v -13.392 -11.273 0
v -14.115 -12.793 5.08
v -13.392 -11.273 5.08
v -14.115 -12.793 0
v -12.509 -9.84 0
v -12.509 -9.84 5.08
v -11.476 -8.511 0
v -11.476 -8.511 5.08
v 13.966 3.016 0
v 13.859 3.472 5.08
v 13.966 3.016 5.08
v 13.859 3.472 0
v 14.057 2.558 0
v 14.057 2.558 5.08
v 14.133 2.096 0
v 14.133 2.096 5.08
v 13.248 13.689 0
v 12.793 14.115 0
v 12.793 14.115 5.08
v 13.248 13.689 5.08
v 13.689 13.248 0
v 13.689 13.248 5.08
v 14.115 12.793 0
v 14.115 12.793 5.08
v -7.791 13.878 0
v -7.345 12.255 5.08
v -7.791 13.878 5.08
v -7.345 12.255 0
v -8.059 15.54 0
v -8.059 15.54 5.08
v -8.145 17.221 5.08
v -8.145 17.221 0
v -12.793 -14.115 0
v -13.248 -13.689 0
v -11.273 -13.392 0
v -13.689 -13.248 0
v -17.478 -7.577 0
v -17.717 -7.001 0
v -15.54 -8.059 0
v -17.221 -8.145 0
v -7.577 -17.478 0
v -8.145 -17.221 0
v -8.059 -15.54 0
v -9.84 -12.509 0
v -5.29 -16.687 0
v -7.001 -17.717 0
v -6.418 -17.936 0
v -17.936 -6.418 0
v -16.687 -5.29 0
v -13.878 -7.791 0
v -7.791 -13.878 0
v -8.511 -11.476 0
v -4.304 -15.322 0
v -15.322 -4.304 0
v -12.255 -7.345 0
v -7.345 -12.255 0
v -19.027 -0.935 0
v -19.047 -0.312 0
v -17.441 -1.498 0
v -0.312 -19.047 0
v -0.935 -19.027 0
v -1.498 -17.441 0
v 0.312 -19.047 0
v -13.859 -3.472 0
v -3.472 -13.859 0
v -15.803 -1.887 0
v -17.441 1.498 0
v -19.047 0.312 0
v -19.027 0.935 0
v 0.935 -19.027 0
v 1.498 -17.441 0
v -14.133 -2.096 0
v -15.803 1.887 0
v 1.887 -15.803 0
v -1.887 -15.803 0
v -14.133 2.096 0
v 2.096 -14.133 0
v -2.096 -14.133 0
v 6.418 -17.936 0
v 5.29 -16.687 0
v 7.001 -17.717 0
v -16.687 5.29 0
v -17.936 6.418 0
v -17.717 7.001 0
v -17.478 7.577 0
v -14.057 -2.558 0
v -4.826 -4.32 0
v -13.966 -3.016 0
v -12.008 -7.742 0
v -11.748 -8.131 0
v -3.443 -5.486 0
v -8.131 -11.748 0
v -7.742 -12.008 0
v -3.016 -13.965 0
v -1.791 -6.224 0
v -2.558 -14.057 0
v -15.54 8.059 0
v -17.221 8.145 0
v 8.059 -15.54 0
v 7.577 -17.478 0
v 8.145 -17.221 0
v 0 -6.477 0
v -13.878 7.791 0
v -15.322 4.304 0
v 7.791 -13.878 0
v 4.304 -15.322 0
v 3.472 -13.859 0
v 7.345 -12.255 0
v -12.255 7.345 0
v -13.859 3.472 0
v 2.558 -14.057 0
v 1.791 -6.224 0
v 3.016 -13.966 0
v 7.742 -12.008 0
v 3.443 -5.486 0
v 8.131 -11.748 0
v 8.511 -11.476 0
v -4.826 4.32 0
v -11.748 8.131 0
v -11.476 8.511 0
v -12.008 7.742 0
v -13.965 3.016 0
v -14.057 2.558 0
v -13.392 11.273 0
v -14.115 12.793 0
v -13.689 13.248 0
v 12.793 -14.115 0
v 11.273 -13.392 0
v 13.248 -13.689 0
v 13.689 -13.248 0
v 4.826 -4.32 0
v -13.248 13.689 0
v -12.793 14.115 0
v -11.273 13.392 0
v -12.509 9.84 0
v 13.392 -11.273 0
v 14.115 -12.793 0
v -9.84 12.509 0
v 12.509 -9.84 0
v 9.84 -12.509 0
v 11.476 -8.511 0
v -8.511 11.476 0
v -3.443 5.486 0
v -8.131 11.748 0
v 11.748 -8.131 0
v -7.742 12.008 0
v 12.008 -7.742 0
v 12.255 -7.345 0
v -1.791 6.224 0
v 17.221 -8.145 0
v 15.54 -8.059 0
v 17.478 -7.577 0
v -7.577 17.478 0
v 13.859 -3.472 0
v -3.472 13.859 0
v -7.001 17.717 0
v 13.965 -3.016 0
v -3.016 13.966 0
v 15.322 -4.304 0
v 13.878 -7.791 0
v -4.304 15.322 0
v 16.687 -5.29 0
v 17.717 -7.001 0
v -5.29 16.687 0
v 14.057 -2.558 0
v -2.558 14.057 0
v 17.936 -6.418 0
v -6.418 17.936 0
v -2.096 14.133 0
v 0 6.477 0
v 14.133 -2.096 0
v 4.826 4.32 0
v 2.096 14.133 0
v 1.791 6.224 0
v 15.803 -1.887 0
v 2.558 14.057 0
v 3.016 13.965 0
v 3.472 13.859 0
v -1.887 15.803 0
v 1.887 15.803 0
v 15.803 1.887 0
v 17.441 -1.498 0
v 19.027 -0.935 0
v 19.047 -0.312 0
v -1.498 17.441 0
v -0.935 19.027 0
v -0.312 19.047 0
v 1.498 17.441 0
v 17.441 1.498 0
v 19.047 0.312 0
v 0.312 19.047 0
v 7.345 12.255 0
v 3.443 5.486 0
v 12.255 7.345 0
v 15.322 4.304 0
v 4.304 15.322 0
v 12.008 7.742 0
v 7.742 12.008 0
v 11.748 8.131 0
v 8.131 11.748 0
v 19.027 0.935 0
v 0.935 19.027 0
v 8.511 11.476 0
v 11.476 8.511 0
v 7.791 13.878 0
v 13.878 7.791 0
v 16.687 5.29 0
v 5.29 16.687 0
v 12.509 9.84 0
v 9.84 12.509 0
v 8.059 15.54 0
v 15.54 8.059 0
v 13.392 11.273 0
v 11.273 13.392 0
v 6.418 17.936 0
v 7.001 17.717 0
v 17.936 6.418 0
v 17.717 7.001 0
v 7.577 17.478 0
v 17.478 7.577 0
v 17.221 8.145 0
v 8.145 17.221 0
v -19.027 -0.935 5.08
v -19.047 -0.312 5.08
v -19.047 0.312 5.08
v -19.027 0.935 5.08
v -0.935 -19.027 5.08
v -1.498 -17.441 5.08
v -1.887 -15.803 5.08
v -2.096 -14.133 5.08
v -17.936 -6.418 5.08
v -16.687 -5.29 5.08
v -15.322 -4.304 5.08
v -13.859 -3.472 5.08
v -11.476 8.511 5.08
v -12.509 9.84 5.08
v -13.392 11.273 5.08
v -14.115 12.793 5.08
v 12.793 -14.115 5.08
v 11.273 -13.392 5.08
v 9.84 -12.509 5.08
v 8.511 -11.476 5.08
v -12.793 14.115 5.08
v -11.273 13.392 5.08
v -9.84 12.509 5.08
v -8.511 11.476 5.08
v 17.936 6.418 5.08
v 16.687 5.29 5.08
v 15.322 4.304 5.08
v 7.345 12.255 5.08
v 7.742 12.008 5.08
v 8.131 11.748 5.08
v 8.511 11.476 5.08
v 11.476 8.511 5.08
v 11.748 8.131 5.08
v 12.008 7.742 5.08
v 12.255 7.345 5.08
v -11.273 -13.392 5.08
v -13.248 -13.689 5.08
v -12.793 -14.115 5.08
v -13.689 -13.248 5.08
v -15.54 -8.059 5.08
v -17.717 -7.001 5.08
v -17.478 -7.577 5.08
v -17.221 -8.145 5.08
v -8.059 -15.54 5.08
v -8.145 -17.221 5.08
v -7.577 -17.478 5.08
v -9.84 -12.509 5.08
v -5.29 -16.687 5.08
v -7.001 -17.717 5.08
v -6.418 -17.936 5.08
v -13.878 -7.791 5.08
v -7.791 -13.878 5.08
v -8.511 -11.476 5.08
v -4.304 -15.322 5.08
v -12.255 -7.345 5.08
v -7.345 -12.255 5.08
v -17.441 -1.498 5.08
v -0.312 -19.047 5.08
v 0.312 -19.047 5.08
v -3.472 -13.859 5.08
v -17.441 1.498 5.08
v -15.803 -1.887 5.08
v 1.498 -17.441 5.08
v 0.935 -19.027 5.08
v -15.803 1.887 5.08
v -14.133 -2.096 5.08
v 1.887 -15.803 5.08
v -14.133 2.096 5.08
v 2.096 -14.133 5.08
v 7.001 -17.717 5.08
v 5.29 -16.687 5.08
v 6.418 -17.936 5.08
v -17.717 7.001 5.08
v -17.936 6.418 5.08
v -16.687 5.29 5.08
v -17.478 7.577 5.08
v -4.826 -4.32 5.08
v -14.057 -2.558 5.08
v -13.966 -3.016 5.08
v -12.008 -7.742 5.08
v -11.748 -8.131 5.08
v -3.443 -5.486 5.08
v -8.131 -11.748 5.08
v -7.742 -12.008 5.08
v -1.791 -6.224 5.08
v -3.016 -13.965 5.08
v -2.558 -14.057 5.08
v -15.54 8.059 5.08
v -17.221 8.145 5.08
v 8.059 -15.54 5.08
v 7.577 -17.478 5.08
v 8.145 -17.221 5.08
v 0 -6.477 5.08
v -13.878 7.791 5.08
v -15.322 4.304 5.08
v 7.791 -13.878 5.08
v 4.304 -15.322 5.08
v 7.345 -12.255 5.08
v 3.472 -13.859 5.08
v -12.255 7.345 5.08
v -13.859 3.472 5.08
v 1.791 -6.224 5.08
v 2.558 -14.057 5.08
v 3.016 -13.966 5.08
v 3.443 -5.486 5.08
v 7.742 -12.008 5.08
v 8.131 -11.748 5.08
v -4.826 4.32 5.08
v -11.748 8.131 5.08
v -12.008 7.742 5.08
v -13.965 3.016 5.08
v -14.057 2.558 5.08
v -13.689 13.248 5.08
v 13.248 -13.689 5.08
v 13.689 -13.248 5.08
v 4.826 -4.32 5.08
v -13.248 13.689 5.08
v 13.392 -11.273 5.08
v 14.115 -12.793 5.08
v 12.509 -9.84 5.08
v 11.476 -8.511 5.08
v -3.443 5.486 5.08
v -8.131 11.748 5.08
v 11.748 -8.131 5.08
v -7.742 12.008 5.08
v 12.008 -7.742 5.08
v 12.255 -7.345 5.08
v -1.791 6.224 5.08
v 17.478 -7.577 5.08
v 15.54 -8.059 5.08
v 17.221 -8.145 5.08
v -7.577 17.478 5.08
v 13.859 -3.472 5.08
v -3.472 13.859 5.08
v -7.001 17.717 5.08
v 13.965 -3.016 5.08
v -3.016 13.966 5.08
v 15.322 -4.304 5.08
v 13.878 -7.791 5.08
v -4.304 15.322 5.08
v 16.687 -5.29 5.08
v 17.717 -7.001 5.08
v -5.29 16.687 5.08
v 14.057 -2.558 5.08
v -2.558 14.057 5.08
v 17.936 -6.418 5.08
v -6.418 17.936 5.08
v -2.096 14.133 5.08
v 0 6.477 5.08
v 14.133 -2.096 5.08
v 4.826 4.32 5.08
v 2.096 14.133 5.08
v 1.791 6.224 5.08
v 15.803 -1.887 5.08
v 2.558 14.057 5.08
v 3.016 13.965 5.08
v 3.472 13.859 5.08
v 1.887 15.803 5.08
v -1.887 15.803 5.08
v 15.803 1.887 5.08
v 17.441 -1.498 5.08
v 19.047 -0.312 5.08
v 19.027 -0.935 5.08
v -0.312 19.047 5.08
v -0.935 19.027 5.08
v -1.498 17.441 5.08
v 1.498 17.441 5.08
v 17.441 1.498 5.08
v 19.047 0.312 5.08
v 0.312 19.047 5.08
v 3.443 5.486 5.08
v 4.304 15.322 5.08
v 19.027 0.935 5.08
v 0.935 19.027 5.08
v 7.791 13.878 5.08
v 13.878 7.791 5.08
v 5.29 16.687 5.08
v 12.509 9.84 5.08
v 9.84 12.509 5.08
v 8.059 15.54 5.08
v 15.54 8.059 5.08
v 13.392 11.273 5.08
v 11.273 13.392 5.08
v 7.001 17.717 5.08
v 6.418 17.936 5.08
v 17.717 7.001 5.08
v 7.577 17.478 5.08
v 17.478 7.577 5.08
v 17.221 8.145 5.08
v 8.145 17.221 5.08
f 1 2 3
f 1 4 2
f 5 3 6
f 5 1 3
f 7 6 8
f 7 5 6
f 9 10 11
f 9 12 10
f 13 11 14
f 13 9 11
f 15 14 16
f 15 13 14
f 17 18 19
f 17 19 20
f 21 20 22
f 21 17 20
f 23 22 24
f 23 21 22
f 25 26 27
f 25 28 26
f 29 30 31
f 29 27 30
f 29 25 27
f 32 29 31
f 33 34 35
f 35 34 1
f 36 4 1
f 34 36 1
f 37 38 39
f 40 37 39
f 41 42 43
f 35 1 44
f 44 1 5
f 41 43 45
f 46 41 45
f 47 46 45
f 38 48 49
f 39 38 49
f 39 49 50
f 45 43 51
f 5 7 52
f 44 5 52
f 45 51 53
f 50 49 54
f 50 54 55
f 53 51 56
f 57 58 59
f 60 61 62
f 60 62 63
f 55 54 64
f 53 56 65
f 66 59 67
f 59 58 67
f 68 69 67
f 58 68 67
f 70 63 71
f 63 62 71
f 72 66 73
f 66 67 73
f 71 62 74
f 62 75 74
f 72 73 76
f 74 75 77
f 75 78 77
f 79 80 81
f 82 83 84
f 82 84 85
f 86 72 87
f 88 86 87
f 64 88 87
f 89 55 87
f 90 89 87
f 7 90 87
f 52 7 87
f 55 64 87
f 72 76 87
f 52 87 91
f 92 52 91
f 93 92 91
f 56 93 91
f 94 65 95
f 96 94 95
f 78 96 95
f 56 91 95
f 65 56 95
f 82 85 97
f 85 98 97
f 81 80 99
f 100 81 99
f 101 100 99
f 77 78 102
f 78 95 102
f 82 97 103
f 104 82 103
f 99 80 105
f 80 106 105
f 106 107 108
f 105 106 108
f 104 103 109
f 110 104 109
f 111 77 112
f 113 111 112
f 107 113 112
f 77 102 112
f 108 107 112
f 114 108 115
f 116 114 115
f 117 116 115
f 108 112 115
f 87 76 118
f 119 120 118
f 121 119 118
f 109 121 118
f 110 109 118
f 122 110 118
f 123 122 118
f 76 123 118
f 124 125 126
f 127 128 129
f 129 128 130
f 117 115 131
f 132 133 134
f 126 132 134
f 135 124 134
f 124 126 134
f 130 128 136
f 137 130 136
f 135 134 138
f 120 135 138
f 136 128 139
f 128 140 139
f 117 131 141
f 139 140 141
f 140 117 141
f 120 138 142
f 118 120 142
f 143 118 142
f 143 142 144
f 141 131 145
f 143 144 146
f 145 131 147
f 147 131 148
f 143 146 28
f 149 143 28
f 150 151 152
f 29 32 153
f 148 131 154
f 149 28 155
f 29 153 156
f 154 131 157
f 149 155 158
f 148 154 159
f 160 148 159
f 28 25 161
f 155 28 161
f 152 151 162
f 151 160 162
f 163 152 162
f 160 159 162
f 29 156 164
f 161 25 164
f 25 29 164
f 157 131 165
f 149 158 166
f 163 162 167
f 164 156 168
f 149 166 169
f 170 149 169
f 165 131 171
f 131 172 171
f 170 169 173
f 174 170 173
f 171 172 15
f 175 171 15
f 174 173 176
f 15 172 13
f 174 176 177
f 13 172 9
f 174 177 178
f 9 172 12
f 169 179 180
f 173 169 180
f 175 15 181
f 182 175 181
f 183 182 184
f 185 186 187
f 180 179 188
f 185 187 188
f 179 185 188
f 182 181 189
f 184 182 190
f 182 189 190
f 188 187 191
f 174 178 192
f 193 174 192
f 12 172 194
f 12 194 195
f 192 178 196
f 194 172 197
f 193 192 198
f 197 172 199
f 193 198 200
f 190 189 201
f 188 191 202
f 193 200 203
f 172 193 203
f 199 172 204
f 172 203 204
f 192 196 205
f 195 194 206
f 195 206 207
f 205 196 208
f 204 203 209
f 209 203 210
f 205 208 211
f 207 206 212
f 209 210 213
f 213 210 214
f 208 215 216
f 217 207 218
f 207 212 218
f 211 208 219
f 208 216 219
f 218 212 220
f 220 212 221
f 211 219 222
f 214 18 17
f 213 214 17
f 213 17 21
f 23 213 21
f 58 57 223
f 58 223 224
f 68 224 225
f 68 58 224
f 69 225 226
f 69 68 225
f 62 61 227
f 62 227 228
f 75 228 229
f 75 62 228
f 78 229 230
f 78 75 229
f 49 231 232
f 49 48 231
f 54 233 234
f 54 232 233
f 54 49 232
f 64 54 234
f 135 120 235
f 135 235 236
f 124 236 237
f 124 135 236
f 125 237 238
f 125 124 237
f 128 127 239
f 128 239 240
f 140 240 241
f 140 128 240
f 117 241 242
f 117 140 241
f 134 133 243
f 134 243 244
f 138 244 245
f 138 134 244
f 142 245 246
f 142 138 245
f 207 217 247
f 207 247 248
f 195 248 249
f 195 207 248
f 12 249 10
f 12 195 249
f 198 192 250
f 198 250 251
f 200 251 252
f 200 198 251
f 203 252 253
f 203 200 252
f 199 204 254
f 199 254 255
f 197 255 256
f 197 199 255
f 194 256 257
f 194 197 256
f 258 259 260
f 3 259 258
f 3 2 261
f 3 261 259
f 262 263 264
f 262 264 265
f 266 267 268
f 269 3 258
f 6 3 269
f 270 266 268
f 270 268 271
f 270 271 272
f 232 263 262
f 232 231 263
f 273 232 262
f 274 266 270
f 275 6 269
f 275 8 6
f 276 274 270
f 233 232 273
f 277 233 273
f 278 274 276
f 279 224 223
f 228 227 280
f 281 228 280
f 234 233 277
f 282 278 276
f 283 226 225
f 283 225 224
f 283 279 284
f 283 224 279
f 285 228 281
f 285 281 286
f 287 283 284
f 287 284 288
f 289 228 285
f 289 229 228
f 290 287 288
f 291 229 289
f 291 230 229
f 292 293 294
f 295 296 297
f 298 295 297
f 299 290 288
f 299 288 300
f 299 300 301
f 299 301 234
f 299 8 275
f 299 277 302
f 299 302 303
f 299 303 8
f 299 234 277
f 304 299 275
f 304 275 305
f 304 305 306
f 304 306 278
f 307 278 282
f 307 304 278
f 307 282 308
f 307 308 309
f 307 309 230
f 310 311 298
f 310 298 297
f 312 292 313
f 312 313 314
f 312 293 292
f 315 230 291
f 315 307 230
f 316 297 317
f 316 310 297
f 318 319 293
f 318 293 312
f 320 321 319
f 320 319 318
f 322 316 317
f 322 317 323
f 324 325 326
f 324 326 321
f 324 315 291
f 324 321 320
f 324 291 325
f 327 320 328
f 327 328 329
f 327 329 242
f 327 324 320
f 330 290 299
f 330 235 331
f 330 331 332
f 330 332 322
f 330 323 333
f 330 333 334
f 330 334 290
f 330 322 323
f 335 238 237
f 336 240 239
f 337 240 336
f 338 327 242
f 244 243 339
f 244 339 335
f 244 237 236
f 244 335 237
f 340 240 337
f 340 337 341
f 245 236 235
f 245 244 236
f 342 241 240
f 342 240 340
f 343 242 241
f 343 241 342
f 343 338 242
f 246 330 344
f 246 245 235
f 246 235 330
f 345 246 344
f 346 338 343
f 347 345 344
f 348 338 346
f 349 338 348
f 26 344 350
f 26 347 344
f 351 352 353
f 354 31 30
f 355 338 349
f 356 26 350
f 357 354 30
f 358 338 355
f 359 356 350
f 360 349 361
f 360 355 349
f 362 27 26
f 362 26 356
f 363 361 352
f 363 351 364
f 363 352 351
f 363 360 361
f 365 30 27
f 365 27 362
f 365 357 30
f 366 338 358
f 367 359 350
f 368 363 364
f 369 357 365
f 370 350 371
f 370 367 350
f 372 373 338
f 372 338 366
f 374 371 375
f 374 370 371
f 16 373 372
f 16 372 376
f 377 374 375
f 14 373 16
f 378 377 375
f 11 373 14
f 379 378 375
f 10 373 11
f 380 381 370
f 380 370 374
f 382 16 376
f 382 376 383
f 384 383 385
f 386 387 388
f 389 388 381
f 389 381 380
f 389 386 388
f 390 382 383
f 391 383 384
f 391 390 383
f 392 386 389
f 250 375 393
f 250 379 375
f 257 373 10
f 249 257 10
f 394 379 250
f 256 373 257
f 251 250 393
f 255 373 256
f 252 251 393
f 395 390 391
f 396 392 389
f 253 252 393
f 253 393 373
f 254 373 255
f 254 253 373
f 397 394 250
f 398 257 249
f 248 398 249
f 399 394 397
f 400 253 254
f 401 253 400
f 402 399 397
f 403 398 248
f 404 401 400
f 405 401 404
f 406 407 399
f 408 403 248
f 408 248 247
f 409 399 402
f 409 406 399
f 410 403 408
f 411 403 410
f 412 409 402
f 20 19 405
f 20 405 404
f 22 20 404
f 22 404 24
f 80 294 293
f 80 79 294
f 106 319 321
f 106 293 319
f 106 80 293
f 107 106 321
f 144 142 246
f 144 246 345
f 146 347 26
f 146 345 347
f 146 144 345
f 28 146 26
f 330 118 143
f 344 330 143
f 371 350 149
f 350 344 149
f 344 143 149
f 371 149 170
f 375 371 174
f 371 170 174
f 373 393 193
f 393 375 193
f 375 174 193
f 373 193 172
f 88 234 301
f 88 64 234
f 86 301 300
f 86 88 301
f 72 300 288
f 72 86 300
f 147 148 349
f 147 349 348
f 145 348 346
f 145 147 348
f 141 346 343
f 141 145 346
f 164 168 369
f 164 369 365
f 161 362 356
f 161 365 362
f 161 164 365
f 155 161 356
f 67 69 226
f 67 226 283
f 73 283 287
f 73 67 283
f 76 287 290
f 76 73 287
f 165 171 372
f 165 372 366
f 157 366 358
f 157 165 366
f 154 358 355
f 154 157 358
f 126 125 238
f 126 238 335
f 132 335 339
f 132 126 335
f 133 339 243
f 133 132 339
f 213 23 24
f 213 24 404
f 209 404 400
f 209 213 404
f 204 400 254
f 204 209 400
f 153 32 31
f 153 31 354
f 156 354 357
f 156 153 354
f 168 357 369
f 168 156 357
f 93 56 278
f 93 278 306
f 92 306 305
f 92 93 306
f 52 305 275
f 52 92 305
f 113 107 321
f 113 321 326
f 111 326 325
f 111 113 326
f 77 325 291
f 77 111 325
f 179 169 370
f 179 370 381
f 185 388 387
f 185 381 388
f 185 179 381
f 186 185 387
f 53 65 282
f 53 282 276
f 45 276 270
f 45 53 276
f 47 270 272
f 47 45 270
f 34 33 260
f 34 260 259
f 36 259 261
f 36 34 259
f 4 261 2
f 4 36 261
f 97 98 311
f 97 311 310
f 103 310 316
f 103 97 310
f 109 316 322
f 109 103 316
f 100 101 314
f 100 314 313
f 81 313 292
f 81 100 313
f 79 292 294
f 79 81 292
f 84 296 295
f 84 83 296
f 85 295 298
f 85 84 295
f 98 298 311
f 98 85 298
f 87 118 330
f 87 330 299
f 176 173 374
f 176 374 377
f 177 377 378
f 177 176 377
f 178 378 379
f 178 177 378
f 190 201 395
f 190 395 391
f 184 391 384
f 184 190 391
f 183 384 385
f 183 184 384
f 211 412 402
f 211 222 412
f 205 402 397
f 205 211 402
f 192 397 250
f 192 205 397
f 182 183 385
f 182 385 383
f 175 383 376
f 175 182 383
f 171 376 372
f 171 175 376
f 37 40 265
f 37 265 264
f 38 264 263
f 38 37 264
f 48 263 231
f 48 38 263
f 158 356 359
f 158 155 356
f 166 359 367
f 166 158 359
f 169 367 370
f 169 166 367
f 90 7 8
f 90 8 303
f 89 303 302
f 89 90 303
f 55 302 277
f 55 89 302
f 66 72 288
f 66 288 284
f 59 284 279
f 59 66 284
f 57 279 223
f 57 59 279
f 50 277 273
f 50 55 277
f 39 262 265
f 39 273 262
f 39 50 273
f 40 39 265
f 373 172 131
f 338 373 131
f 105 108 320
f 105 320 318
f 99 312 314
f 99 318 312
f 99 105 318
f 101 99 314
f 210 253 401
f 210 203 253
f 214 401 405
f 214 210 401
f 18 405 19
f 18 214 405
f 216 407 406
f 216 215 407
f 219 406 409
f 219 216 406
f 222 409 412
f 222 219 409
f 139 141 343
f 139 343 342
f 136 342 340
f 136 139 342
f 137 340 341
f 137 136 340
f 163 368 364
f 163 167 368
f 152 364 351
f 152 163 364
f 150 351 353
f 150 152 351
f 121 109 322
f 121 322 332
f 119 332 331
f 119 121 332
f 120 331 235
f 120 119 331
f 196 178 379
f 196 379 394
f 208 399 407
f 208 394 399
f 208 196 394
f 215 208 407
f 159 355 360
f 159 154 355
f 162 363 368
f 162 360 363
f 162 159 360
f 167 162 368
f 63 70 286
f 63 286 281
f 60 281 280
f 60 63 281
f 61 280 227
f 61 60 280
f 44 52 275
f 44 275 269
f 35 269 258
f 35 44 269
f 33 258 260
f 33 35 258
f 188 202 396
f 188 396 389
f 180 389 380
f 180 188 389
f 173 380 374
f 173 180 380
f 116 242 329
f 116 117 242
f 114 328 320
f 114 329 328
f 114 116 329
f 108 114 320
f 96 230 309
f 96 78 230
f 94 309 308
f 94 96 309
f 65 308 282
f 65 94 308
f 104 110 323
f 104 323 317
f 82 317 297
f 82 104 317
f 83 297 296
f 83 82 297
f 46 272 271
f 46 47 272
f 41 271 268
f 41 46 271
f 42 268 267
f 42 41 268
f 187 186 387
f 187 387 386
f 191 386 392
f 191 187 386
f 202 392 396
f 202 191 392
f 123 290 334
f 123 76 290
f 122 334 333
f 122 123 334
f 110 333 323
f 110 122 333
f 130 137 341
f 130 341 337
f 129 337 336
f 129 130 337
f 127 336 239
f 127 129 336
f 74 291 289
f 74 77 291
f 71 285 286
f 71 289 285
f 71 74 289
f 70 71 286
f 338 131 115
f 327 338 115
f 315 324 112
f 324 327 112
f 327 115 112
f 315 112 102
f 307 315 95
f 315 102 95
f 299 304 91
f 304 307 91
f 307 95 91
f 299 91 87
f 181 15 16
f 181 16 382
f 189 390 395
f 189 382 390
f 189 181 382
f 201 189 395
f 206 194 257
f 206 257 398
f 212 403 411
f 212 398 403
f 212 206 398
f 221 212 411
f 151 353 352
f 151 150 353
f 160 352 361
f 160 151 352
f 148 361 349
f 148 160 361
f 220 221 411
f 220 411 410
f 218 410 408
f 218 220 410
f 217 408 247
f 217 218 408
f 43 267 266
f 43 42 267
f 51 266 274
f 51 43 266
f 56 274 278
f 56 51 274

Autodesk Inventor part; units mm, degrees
ref_plane "YZ Plane" through (0, 0, 0) normal (1, 0, 0) x (0, 1, 0)
ref_plane "XZ Plane" through (0, 0, 0) normal (0, 1, 0) x (-1, 0, 0)
ref_plane "XY Plane" through (0, 0, 0) normal (0, 0, 1) x (1, 0, 0)
sketch "Sketch3" plane through (0, 0, 0) normal (0, 0, 1) x (1, 0, 0)
  arc A0 (12.7932, -14.1151) -> (14.1151, -12.7932) centre (0, 0) ccw
  arc A1 (14.1151, -12.7932) -> (11.4758, -8.5111) centre (-0.2655, -18.7022) ccw
  arc A2 (11.4758, -8.5111) -> (12.2548, -7.3452) centre (0, 0) ccw
  arc A3 (12.2548, -7.3452) -> (17.221, -8.1449) centre (17.177, 7.4023) ccw
  arc A4 (17.221, -8.1449) -> (17.9364, -6.4178) centre (0, 0) ccw
  arc A5 (17.9364, -6.4178) -> (13.8593, -3.4716) centre (6.9118, -17.3802) ccw
  arc A6 (13.8593, -3.4716) -> (14.1329, -2.0964) centre (0, 0) ccw
  arc A7 (14.1329, -2.0964) -> (19.0271, -0.9347) centre (13.0367, 13.4122) ccw
  arc A8 (19.0271, -0.9347) -> (19.0271, 0.9347) centre (0, 0) ccw
  arc A9 (19.0271, 0.9347) -> (14.1329, 2.0964) centre (13.0367, -13.4122) ccw
  arc A10 (14.1329, 2.0964) -> (13.8593, 3.4716) centre (0, 0) ccw
  arc A11 (13.8593, 3.4716) -> (17.9364, 6.4178) centre (6.9118, 17.3802) ccw
  arc A12 (17.9364, 6.4178) -> (17.221, 8.1449) centre (0, 0) ccw
  arc A13 (17.221, 8.1449) -> (12.2548, 7.3452) centre (17.177, -7.4023) ccw
  arc A14 (12.2548, 7.3452) -> (11.4758, 8.5111) centre (0, 0) ccw
  arc A15 (11.4758, 8.5111) -> (14.1151, 12.7932) centre (-0.2655, 18.7022) ccw
  arc A16 (14.1151, 12.7932) -> (12.7932, 14.1151) centre (0, 0) ccw
  arc A17 (12.7932, 14.1151) -> (8.5111, 11.4758) centre (18.7022, -0.2655) ccw
  arc A18 (8.5111, 11.4758) -> (7.3452, 12.2548) centre (0, 0) ccw
  arc A19 (7.3452, 12.2548) -> (8.1449, 17.221) centre (-7.4023, 17.177) ccw
  arc A20 (8.1449, 17.221) -> (6.4178, 17.9364) centre (0, 0) ccw
  arc A21 (6.4178, 17.9364) -> (3.4716, 13.8593) centre (17.3802, 6.9118) ccw
  arc A22 (3.4716, 13.8593) -> (2.0964, 14.1329) centre (0, 0) ccw
  arc A23 (2.0964, 14.1329) -> (0.9347, 19.0271) centre (-13.4122, 13.0367) ccw
  arc A24 (0.9347, 19.0271) -> (-0.9347, 19.0271) centre (0, 0) ccw
  arc A25 (-0.9347, 19.0271) -> (-2.0964, 14.1329) centre (13.4122, 13.0367) ccw
  arc A26 (-2.0964, 14.1329) -> (-3.4716, 13.8593) centre (0, 0) ccw
  arc A27 (-3.4716, 13.8593) -> (-6.4178, 17.9364) centre (-17.3802, 6.9118) ccw
  arc A28 (-6.4178, 17.9364) -> (-8.1449, 17.221) centre (0, 0) ccw
  arc A29 (-8.1449, 17.221) -> (-7.3452, 12.2548) centre (7.4023, 17.177) ccw
  arc A30 (-7.3452, 12.2548) -> (-8.5111, 11.4758) centre (0, 0) ccw
  arc A31 (-8.5111, 11.4758) -> (-12.7932, 14.1151) centre (-18.7022, -0.2655) ccw
  arc A32 (-12.7932, 14.1151) -> (-14.1151, 12.7932) centre (0, 0) ccw
  arc A33 (-14.1151, 12.7932) -> (-11.4758, 8.5111) centre (0.2655, 18.7022) ccw
  arc A34 (-11.4758, 8.5111) -> (-12.2548, 7.3452) centre (0, 0) ccw
  arc A35 (-12.2548, 7.3452) -> (-17.221, 8.1449) centre (-17.177, -7.4023) ccw
  arc A36 (-17.221, 8.1449) -> (-17.9364, 6.4178) centre (0, 0) ccw
  arc A37 (-17.9364, 6.4178) -> (-13.8593, 3.4716) centre (-6.9118, 17.3802) ccw
  arc A38 (-13.8593, 3.4716) -> (-14.1329, 2.0964) centre (0, 0) ccw
  arc A39 (-14.1329, 2.0964) -> (-19.0271, 0.9347) centre (-13.0367, -13.4122) ccw
  arc A40 (-19.0271, 0.9347) -> (-19.0271, -0.9347) centre (0, 0) ccw
  arc A41 (-19.0271, -0.9347) -> (-14.1329, -2.0964) centre (-13.0367, 13.4122) ccw
  arc A42 (-14.1329, -2.0964) -> (-13.8593, -3.4716) centre (0, 0) ccw
  arc A43 (-13.8593, -3.4716) -> (-17.9364, -6.4178) centre (-6.9118, -17.3802) ccw
  arc A44 (-17.9364, -6.4178) -> (-17.221, -8.1449) centre (0, 0) ccw
  arc A45 (-17.221, -8.1449) -> (-12.2548, -7.3452) centre (-17.177, 7.4023) ccw
  arc A46 (-12.2548, -7.3452) -> (-11.4758, -8.5111) centre (0, 0) ccw
  arc A47 (-11.4758, -8.5111) -> (-14.1151, -12.7932) centre (0.2655, -18.7022) ccw
  arc A48 (-14.1151, -12.7932) -> (-12.7932, -14.1151) centre (0, 0) ccw
  arc A49 (-12.7932, -14.1151) -> (-8.5111, -11.4758) centre (-18.7022, 0.2655) ccw
  arc A50 (-8.5111, -11.4758) -> (-7.3452, -12.2548) centre (0, 0) ccw
  arc A51 (-7.3452, -12.2548) -> (-8.1449, -17.221) centre (7.4023, -17.177) ccw
  arc A52 (-8.1449, -17.221) -> (-6.4178, -17.9364) centre (0, 0) ccw
  arc A53 (-6.4178, -17.9364) -> (-3.4716, -13.8593) centre (-17.3802, -6.9118) ccw
  arc A54 (-3.4716, -13.8593) -> (-2.0964, -14.1329) centre (0, 0) ccw
  arc A55 (-2.0964, -14.1329) -> (-0.9347, -19.0271) centre (13.4122, -13.0367) ccw
  arc A56 (-0.9347, -19.0271) -> (0.9347, -19.0271) centre (0, 0) ccw
  arc A57 (0.9347, -19.0271) -> (2.0964, -14.1329) centre (-13.4122, -13.0367) ccw
  arc A58 (2.0964, -14.1329) -> (3.4716, -13.8593) centre (0, 0) ccw
  arc A59 (3.4716, -13.8593) -> (6.4178, -17.9364) centre (17.3802, -6.9118) ccw
  arc A60 (6.4178, -17.9364) -> (8.1449, -17.221) centre (0, 0) ccw
  arc A61 (8.1449, -17.221) -> (7.3452, -12.2548) centre (-7.4023, -17.177) ccw
  arc A62 (7.3452, -12.2548) -> (8.5111, -11.4758) centre (0, 0) ccw
  arc A63 (8.5111, -11.4758) -> (12.7932, -14.1151) centre (18.7022, 0.2655) ccw
  circle A64 centre (0, 0) radius 16.9291 construction
  line L0 (-4.826, 4.3199) -> (-4.826, -4.3199)
  line L1 (4.826, 4.3199) -> (4.826, -4.3199)
  arc A65 (-4.826, -4.3199) -> (4.826, -4.3199) centre (0, 0) ccw
  arc A66 (4.826, 4.3199) -> (-4.826, 4.3199) centre (0, 0) ccw
  dimension "d14" = 19.05
  dimension "d15" = 33.8582
  dimension "d8" = 4.826
  dimension "d9" = 9.652
  dimension "d10" = 6.477
  dimension "d11" = 6.477
extrude "Extrusion2" add sketch "Sketch3" along normal blind 5.08
properties part number "Pinion"
